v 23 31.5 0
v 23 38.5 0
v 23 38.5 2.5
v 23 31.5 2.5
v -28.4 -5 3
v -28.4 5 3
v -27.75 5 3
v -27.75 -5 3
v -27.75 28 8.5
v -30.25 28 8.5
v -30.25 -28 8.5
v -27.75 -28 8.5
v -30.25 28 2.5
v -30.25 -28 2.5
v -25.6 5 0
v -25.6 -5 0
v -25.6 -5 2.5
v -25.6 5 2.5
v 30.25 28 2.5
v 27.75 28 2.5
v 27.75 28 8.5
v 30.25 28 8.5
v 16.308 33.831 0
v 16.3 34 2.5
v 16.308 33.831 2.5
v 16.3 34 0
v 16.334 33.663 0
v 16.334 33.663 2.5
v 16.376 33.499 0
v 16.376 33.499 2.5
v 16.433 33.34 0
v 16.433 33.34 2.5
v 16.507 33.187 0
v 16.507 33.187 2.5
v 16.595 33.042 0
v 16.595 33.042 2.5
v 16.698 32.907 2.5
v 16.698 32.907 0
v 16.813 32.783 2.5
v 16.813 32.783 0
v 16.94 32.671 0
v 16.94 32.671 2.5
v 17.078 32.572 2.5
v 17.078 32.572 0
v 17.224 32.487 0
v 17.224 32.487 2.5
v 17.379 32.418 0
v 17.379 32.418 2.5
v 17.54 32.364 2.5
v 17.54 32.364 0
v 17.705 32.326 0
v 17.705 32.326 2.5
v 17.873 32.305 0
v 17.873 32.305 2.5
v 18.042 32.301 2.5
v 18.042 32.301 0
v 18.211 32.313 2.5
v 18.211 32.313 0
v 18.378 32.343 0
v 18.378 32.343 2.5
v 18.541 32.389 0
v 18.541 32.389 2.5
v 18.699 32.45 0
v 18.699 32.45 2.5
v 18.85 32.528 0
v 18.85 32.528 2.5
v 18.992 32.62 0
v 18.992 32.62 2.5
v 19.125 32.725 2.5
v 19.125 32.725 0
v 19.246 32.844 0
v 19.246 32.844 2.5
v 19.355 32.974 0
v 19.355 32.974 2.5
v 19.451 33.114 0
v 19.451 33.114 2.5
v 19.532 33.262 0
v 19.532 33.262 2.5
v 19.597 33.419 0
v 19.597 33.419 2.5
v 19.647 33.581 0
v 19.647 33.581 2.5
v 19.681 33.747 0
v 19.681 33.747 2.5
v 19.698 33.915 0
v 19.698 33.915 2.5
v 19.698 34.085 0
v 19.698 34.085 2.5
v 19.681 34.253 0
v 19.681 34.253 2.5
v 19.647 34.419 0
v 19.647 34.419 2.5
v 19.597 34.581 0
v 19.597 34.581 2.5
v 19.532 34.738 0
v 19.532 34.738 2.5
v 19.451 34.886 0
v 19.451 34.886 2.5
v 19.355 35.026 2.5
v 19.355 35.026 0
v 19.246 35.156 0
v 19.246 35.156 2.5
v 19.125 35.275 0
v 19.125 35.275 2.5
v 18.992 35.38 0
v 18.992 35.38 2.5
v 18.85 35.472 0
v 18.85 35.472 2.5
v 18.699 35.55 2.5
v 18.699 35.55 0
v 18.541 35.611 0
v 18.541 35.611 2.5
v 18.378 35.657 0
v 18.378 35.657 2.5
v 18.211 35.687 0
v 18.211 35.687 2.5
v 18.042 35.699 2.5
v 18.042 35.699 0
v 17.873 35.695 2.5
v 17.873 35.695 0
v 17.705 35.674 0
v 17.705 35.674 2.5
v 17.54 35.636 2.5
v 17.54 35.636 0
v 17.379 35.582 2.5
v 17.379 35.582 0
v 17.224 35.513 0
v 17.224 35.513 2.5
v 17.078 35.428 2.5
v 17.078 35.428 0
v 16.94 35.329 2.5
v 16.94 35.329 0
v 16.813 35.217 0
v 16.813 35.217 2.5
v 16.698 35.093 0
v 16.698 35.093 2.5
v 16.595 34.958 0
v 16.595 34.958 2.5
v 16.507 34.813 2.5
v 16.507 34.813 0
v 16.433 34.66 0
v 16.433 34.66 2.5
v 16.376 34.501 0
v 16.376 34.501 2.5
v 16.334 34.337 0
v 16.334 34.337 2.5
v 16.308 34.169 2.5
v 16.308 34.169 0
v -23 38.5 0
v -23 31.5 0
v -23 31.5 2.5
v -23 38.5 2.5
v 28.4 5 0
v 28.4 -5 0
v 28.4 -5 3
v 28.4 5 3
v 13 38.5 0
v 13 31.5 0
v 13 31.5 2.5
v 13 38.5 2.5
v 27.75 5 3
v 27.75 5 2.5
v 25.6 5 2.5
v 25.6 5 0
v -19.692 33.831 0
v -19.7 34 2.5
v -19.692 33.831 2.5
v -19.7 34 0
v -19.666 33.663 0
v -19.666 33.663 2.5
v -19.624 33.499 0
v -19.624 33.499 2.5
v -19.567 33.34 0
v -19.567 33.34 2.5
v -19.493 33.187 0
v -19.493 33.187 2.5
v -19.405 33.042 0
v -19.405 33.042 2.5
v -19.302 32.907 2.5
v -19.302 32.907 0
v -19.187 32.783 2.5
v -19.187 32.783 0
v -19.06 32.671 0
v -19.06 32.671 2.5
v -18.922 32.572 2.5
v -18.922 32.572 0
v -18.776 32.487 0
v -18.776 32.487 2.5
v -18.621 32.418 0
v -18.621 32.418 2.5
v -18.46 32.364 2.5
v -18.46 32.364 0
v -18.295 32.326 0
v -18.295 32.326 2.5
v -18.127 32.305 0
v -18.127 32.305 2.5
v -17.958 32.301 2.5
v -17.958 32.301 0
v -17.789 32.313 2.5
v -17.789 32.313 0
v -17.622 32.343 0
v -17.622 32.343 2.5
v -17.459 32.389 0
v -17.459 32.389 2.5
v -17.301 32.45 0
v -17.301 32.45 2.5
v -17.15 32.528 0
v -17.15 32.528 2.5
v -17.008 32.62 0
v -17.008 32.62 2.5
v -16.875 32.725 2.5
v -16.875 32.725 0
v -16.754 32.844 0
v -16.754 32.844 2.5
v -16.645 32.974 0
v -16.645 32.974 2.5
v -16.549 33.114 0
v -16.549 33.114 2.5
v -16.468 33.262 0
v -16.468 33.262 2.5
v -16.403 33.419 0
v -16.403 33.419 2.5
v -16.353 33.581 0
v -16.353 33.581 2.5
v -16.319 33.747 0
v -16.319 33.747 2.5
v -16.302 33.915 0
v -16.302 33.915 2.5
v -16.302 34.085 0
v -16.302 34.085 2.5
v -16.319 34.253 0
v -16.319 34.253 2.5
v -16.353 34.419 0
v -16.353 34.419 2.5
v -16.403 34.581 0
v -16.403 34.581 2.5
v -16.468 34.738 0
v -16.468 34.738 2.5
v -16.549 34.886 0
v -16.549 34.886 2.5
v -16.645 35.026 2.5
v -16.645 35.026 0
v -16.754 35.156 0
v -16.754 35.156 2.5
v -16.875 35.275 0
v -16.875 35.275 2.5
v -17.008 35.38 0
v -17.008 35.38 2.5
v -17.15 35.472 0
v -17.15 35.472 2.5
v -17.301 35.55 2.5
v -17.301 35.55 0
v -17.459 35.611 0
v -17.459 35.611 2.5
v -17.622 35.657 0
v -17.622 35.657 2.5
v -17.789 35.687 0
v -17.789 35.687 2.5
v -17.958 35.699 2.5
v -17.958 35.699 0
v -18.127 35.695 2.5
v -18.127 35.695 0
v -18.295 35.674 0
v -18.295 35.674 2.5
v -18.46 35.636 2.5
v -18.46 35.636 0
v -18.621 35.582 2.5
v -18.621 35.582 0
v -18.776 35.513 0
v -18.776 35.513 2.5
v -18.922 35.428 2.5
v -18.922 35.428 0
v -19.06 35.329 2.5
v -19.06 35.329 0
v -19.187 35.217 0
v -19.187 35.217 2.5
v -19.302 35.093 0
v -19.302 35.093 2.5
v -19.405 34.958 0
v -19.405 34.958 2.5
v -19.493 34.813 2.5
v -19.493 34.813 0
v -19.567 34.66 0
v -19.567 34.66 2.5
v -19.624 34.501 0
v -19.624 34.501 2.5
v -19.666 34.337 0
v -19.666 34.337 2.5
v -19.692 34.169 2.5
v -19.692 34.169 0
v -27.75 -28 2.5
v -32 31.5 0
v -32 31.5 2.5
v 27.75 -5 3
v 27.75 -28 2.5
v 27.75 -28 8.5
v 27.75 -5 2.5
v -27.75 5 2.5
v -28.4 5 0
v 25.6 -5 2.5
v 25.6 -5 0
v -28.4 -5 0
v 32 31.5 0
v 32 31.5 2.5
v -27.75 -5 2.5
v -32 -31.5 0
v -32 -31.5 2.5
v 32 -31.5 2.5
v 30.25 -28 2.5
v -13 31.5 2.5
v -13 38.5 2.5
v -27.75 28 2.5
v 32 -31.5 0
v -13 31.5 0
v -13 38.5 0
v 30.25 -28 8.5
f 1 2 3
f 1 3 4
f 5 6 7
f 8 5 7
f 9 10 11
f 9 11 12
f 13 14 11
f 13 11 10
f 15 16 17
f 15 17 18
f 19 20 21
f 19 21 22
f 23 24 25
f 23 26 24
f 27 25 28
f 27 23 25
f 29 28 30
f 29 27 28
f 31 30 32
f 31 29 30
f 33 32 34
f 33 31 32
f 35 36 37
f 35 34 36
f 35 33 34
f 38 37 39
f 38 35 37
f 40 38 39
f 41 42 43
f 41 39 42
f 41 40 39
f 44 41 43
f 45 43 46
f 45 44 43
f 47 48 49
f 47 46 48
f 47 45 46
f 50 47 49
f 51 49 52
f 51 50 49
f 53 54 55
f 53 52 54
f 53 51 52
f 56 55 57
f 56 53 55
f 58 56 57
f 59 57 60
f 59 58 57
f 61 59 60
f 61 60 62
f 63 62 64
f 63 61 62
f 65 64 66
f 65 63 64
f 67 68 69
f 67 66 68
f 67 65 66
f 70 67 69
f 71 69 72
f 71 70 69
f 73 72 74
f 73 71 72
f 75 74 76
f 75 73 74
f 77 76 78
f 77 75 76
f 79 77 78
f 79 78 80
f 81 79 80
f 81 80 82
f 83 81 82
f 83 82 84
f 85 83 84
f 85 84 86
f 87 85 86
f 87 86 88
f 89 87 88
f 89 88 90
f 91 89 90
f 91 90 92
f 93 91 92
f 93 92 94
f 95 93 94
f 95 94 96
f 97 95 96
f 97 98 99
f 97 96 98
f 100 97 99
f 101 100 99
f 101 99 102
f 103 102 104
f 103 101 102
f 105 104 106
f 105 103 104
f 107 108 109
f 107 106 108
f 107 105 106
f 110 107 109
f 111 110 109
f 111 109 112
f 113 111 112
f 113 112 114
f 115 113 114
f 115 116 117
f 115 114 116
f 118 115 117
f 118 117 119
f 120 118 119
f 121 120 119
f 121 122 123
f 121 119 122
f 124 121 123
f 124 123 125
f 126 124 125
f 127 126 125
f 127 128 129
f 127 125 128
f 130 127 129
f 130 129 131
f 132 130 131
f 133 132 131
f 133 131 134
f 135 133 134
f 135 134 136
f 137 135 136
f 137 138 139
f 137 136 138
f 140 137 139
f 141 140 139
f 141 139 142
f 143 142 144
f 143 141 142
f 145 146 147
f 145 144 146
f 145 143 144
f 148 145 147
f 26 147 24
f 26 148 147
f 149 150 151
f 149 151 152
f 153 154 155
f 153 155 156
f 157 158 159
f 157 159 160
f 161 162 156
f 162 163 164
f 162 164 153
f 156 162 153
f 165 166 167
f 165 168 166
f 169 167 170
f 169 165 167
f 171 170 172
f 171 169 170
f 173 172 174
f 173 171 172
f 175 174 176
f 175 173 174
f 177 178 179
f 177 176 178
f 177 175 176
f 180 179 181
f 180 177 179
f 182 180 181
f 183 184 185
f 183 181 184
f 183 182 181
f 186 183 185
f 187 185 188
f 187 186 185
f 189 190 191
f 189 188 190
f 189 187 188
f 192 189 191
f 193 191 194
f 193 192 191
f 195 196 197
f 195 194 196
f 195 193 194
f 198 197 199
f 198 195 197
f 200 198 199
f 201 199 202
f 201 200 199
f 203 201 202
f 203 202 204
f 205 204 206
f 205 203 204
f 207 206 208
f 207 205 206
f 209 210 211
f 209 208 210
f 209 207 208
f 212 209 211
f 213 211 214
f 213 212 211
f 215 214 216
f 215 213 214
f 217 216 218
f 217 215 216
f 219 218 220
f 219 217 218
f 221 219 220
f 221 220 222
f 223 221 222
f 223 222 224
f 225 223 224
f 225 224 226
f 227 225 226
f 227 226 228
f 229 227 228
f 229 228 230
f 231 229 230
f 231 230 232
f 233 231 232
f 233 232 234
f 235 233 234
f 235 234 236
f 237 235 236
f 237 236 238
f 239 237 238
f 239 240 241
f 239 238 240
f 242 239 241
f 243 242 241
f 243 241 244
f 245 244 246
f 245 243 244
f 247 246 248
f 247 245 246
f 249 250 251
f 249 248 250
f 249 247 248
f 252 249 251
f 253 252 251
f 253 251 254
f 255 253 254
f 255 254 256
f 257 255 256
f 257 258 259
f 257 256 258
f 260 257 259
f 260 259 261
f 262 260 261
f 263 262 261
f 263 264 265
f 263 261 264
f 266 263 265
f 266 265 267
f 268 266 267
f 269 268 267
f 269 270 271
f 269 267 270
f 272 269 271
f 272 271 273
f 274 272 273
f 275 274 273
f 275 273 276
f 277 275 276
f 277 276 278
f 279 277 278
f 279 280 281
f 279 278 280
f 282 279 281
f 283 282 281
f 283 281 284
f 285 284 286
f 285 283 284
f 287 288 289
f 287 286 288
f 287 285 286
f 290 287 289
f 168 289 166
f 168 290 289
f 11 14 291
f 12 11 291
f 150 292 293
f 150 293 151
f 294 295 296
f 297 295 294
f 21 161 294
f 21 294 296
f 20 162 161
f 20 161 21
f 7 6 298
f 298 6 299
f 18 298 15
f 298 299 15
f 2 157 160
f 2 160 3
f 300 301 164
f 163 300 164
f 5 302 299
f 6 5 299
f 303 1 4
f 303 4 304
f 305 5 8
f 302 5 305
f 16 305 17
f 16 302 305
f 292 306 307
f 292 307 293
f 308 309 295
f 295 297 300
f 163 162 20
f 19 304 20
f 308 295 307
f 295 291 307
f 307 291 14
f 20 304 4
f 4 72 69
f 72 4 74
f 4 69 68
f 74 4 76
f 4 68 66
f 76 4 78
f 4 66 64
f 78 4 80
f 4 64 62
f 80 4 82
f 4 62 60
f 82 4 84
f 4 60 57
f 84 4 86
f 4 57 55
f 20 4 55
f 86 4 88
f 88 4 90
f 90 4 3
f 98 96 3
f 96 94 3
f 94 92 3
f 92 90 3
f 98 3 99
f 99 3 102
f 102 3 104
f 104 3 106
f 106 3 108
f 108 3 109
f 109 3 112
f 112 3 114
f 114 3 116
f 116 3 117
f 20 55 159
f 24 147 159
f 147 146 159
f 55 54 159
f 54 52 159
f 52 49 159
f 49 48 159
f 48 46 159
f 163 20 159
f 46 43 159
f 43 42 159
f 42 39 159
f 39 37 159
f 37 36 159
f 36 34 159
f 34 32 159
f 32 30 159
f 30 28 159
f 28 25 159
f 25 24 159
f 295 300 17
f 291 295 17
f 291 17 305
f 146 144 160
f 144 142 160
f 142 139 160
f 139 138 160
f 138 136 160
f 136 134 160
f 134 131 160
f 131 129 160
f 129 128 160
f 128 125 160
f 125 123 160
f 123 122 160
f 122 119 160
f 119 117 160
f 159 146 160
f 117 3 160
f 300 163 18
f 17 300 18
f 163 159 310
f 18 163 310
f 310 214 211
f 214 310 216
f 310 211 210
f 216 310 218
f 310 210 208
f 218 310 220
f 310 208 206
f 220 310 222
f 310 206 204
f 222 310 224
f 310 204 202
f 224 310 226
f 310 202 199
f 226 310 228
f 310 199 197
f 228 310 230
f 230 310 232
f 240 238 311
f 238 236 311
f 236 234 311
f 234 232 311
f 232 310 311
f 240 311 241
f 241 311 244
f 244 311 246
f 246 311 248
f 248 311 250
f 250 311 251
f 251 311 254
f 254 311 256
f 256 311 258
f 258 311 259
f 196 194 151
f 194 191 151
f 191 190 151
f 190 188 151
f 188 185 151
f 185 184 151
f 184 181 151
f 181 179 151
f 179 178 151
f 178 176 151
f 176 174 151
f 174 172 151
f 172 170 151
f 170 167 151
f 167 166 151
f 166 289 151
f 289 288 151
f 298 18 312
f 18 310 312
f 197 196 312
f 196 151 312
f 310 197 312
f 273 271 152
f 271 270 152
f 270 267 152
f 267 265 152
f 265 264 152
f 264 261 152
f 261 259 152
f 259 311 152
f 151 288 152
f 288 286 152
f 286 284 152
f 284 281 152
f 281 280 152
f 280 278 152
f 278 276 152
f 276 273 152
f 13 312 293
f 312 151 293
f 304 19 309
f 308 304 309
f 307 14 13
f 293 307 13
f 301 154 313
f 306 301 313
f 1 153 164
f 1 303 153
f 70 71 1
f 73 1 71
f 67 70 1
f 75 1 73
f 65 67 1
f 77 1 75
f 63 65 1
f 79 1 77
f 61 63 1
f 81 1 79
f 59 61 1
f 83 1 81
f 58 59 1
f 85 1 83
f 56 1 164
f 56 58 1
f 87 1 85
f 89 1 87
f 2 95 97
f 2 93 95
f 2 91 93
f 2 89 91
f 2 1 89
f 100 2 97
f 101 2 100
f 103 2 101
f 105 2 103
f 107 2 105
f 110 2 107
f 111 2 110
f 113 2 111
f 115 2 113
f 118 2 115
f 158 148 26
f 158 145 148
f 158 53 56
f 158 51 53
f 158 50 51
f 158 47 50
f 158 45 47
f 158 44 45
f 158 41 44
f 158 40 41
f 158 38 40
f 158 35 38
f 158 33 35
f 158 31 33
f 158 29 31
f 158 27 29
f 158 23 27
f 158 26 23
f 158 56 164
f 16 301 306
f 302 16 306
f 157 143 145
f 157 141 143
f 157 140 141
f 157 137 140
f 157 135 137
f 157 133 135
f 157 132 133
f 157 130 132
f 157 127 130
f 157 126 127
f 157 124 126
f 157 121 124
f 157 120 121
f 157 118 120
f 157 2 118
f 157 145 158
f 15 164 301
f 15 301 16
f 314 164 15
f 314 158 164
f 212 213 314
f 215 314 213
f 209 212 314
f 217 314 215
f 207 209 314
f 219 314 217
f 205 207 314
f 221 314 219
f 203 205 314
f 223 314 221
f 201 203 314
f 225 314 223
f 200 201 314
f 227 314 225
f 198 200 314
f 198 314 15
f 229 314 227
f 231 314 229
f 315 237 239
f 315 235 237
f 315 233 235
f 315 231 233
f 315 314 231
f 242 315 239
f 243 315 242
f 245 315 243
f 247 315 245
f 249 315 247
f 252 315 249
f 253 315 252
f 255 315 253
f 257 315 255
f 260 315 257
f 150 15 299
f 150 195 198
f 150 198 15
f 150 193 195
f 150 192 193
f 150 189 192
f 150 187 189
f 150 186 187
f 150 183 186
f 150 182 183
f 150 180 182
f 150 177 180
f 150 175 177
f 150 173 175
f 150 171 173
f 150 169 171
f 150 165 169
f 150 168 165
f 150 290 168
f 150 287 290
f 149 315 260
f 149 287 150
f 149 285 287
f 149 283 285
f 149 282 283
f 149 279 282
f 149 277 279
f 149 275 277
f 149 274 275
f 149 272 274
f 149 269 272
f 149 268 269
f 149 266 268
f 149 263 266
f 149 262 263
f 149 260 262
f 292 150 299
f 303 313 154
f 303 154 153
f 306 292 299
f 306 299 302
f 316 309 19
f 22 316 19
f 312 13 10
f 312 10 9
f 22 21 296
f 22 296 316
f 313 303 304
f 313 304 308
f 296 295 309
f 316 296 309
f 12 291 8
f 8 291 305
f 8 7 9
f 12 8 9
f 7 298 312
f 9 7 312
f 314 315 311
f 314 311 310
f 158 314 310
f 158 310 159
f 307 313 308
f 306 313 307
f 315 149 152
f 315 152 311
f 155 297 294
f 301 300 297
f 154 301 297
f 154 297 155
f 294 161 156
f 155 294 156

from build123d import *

# Parameters (mm, degrees)
BOARD_SUPPORT_AND_LUGS_DEPTH = 2.5
PCB_EDGE_STOPS_START         = 2.5
SKETCH_PCB_EDGE_STOPS_W      = 2.5
SKETCH_PCB_EDGE_STOPS_H      = 56
PCB_EDGE_STOPS_DEPTH         = 6
BOARD_STRAP_SLOTS_START      = -1
SKETCH_BOARD_STRAP_SLOTS_W   = 2.8
SKETCH_BOARD_STRAP_SLOTS_H   = 10
BOARD_STRAP_SLOTS_DEPTH      = 4
EXTERNAL_M3_MOUNTS_START     = -1
SKETCH_EXTERNAL_M3_MOUNTS_R  = 1.7
EXTERNAL_M3_MOUNTS_DEPTH     = 5


with BuildPart() as part:
    # Sketch_Board_support_and_lugs → Board_support_and_lugs (new body)
    with BuildSketch(Plane.XY):
        Polygon((32, 31.5), (32, -31.5), (-32, -31.5), (-32, 31.5), (-23, 31.5), (-23, 38.5), (-13, 38.5), (-13, 31.5), (13, 31.5), (13, 38.5), (23, 38.5), (23, 31.5), align=None)
    extrude(amount=BOARD_SUPPORT_AND_LUGS_DEPTH)

    # Sketch_PCB_edge_stops → PCB_edge_stops (add)
    with BuildSketch(Plane.XY.offset(PCB_EDGE_STOPS_START)):
        with Locations((-29, 0)):
            Rectangle(SKETCH_PCB_EDGE_STOPS_W, SKETCH_PCB_EDGE_STOPS_H)
        with Locations((29, 0)):
            Rectangle(SKETCH_PCB_EDGE_STOPS_W, SKETCH_PCB_EDGE_STOPS_H)
    extrude(amount=PCB_EDGE_STOPS_DEPTH)

    # Sketch_Board_strap_slots → Board_strap_slots (cut)
    with BuildSketch(Plane.XY.offset(BOARD_STRAP_SLOTS_START)):
        with Locations((-27, 0)):
            Rectangle(SKETCH_BOARD_STRAP_SLOTS_W, SKETCH_BOARD_STRAP_SLOTS_H)
        with Locations((27, 0)):
            Rectangle(SKETCH_BOARD_STRAP_SLOTS_W, SKETCH_BOARD_STRAP_SLOTS_H)
    extrude(amount=BOARD_STRAP_SLOTS_DEPTH, mode=Mode.SUBTRACT)

    # Sketch_External_M3_mounts → External_M3_mounts (cut)
    with BuildSketch(Plane.XY.offset(EXTERNAL_M3_MOUNTS_START)):
        with Locations(Location((-18, 34, 0), (0, 0, 180))):
            Circle(SKETCH_EXTERNAL_M3_MOUNTS_R)
        with Locations(Location((18, 34, 0), (0, 0, 180))):
            Circle(SKETCH_EXTERNAL_M3_MOUNTS_R)
    extrude(amount=EXTERNAL_M3_MOUNTS_DEPTH, mode=Mode.SUBTRACT)


solid = part.part
